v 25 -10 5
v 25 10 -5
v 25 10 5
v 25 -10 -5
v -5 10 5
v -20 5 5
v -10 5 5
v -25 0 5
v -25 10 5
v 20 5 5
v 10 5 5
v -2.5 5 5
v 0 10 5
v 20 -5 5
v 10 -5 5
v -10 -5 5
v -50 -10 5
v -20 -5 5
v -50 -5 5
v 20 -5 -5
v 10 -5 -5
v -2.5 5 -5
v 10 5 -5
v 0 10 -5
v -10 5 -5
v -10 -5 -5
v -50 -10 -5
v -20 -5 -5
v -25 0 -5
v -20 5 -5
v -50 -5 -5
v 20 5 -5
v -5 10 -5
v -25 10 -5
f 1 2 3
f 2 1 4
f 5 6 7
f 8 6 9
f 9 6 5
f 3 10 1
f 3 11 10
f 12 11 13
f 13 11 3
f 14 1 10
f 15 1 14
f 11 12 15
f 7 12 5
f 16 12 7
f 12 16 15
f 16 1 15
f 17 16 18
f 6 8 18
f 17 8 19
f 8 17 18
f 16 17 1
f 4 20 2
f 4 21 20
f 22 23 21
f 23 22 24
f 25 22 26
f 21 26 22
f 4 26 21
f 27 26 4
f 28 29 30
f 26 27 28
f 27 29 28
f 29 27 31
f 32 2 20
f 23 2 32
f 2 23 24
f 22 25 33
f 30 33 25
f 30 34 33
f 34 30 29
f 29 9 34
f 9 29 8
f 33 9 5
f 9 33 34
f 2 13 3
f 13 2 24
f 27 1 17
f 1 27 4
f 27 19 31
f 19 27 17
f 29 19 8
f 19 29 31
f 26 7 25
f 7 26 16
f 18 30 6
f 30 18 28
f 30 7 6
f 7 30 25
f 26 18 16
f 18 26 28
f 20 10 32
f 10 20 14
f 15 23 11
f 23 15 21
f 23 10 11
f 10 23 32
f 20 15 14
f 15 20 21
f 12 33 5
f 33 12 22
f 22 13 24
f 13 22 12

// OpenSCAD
module bracket() {
    difference() {
        union() {
            // Central rectangular body
            translate([-25, -10, -5])
                cube([50, 20, 10]);

            // Left wedge-shaped wing
            translate([-50, -10, -5])
                linear_extrude(height=10)
                    polygon(points=[[0, 0], [25, 0], [25, 10], [0, 5]]);

            // Right wedge-shaped wing
            translate([25, -10, -5])
                linear_extrude(height=10)
                    polygon(points=[[0, 0], [-25, 0], [-25, 10], [0, 5]]);
        }

        // Rectangular slots/pockets
        translate([-20, -5, -5.1])
            cube([10, 10, 10.2]);
        translate([10, -5, -5.1])
            cube([10, 10, 10.2]);

        // Diamond/square through-holes
        translate([-37.5, 0, -5.1])
            rotate([0, 0, 45])
                square([5, 5], center=true);
        translate([37.5, 0, -5.1])
            rotate([0, 0, 45])
                square([5, 5], center=true);

        // V-shaped notch/opening
        translate([-5, 10, -5.1])
            linear_extrude(height=10.2)
                polygon(points=[[0, 0], [5, 0], [2.5, -5]]);
    }
}

bracket();
